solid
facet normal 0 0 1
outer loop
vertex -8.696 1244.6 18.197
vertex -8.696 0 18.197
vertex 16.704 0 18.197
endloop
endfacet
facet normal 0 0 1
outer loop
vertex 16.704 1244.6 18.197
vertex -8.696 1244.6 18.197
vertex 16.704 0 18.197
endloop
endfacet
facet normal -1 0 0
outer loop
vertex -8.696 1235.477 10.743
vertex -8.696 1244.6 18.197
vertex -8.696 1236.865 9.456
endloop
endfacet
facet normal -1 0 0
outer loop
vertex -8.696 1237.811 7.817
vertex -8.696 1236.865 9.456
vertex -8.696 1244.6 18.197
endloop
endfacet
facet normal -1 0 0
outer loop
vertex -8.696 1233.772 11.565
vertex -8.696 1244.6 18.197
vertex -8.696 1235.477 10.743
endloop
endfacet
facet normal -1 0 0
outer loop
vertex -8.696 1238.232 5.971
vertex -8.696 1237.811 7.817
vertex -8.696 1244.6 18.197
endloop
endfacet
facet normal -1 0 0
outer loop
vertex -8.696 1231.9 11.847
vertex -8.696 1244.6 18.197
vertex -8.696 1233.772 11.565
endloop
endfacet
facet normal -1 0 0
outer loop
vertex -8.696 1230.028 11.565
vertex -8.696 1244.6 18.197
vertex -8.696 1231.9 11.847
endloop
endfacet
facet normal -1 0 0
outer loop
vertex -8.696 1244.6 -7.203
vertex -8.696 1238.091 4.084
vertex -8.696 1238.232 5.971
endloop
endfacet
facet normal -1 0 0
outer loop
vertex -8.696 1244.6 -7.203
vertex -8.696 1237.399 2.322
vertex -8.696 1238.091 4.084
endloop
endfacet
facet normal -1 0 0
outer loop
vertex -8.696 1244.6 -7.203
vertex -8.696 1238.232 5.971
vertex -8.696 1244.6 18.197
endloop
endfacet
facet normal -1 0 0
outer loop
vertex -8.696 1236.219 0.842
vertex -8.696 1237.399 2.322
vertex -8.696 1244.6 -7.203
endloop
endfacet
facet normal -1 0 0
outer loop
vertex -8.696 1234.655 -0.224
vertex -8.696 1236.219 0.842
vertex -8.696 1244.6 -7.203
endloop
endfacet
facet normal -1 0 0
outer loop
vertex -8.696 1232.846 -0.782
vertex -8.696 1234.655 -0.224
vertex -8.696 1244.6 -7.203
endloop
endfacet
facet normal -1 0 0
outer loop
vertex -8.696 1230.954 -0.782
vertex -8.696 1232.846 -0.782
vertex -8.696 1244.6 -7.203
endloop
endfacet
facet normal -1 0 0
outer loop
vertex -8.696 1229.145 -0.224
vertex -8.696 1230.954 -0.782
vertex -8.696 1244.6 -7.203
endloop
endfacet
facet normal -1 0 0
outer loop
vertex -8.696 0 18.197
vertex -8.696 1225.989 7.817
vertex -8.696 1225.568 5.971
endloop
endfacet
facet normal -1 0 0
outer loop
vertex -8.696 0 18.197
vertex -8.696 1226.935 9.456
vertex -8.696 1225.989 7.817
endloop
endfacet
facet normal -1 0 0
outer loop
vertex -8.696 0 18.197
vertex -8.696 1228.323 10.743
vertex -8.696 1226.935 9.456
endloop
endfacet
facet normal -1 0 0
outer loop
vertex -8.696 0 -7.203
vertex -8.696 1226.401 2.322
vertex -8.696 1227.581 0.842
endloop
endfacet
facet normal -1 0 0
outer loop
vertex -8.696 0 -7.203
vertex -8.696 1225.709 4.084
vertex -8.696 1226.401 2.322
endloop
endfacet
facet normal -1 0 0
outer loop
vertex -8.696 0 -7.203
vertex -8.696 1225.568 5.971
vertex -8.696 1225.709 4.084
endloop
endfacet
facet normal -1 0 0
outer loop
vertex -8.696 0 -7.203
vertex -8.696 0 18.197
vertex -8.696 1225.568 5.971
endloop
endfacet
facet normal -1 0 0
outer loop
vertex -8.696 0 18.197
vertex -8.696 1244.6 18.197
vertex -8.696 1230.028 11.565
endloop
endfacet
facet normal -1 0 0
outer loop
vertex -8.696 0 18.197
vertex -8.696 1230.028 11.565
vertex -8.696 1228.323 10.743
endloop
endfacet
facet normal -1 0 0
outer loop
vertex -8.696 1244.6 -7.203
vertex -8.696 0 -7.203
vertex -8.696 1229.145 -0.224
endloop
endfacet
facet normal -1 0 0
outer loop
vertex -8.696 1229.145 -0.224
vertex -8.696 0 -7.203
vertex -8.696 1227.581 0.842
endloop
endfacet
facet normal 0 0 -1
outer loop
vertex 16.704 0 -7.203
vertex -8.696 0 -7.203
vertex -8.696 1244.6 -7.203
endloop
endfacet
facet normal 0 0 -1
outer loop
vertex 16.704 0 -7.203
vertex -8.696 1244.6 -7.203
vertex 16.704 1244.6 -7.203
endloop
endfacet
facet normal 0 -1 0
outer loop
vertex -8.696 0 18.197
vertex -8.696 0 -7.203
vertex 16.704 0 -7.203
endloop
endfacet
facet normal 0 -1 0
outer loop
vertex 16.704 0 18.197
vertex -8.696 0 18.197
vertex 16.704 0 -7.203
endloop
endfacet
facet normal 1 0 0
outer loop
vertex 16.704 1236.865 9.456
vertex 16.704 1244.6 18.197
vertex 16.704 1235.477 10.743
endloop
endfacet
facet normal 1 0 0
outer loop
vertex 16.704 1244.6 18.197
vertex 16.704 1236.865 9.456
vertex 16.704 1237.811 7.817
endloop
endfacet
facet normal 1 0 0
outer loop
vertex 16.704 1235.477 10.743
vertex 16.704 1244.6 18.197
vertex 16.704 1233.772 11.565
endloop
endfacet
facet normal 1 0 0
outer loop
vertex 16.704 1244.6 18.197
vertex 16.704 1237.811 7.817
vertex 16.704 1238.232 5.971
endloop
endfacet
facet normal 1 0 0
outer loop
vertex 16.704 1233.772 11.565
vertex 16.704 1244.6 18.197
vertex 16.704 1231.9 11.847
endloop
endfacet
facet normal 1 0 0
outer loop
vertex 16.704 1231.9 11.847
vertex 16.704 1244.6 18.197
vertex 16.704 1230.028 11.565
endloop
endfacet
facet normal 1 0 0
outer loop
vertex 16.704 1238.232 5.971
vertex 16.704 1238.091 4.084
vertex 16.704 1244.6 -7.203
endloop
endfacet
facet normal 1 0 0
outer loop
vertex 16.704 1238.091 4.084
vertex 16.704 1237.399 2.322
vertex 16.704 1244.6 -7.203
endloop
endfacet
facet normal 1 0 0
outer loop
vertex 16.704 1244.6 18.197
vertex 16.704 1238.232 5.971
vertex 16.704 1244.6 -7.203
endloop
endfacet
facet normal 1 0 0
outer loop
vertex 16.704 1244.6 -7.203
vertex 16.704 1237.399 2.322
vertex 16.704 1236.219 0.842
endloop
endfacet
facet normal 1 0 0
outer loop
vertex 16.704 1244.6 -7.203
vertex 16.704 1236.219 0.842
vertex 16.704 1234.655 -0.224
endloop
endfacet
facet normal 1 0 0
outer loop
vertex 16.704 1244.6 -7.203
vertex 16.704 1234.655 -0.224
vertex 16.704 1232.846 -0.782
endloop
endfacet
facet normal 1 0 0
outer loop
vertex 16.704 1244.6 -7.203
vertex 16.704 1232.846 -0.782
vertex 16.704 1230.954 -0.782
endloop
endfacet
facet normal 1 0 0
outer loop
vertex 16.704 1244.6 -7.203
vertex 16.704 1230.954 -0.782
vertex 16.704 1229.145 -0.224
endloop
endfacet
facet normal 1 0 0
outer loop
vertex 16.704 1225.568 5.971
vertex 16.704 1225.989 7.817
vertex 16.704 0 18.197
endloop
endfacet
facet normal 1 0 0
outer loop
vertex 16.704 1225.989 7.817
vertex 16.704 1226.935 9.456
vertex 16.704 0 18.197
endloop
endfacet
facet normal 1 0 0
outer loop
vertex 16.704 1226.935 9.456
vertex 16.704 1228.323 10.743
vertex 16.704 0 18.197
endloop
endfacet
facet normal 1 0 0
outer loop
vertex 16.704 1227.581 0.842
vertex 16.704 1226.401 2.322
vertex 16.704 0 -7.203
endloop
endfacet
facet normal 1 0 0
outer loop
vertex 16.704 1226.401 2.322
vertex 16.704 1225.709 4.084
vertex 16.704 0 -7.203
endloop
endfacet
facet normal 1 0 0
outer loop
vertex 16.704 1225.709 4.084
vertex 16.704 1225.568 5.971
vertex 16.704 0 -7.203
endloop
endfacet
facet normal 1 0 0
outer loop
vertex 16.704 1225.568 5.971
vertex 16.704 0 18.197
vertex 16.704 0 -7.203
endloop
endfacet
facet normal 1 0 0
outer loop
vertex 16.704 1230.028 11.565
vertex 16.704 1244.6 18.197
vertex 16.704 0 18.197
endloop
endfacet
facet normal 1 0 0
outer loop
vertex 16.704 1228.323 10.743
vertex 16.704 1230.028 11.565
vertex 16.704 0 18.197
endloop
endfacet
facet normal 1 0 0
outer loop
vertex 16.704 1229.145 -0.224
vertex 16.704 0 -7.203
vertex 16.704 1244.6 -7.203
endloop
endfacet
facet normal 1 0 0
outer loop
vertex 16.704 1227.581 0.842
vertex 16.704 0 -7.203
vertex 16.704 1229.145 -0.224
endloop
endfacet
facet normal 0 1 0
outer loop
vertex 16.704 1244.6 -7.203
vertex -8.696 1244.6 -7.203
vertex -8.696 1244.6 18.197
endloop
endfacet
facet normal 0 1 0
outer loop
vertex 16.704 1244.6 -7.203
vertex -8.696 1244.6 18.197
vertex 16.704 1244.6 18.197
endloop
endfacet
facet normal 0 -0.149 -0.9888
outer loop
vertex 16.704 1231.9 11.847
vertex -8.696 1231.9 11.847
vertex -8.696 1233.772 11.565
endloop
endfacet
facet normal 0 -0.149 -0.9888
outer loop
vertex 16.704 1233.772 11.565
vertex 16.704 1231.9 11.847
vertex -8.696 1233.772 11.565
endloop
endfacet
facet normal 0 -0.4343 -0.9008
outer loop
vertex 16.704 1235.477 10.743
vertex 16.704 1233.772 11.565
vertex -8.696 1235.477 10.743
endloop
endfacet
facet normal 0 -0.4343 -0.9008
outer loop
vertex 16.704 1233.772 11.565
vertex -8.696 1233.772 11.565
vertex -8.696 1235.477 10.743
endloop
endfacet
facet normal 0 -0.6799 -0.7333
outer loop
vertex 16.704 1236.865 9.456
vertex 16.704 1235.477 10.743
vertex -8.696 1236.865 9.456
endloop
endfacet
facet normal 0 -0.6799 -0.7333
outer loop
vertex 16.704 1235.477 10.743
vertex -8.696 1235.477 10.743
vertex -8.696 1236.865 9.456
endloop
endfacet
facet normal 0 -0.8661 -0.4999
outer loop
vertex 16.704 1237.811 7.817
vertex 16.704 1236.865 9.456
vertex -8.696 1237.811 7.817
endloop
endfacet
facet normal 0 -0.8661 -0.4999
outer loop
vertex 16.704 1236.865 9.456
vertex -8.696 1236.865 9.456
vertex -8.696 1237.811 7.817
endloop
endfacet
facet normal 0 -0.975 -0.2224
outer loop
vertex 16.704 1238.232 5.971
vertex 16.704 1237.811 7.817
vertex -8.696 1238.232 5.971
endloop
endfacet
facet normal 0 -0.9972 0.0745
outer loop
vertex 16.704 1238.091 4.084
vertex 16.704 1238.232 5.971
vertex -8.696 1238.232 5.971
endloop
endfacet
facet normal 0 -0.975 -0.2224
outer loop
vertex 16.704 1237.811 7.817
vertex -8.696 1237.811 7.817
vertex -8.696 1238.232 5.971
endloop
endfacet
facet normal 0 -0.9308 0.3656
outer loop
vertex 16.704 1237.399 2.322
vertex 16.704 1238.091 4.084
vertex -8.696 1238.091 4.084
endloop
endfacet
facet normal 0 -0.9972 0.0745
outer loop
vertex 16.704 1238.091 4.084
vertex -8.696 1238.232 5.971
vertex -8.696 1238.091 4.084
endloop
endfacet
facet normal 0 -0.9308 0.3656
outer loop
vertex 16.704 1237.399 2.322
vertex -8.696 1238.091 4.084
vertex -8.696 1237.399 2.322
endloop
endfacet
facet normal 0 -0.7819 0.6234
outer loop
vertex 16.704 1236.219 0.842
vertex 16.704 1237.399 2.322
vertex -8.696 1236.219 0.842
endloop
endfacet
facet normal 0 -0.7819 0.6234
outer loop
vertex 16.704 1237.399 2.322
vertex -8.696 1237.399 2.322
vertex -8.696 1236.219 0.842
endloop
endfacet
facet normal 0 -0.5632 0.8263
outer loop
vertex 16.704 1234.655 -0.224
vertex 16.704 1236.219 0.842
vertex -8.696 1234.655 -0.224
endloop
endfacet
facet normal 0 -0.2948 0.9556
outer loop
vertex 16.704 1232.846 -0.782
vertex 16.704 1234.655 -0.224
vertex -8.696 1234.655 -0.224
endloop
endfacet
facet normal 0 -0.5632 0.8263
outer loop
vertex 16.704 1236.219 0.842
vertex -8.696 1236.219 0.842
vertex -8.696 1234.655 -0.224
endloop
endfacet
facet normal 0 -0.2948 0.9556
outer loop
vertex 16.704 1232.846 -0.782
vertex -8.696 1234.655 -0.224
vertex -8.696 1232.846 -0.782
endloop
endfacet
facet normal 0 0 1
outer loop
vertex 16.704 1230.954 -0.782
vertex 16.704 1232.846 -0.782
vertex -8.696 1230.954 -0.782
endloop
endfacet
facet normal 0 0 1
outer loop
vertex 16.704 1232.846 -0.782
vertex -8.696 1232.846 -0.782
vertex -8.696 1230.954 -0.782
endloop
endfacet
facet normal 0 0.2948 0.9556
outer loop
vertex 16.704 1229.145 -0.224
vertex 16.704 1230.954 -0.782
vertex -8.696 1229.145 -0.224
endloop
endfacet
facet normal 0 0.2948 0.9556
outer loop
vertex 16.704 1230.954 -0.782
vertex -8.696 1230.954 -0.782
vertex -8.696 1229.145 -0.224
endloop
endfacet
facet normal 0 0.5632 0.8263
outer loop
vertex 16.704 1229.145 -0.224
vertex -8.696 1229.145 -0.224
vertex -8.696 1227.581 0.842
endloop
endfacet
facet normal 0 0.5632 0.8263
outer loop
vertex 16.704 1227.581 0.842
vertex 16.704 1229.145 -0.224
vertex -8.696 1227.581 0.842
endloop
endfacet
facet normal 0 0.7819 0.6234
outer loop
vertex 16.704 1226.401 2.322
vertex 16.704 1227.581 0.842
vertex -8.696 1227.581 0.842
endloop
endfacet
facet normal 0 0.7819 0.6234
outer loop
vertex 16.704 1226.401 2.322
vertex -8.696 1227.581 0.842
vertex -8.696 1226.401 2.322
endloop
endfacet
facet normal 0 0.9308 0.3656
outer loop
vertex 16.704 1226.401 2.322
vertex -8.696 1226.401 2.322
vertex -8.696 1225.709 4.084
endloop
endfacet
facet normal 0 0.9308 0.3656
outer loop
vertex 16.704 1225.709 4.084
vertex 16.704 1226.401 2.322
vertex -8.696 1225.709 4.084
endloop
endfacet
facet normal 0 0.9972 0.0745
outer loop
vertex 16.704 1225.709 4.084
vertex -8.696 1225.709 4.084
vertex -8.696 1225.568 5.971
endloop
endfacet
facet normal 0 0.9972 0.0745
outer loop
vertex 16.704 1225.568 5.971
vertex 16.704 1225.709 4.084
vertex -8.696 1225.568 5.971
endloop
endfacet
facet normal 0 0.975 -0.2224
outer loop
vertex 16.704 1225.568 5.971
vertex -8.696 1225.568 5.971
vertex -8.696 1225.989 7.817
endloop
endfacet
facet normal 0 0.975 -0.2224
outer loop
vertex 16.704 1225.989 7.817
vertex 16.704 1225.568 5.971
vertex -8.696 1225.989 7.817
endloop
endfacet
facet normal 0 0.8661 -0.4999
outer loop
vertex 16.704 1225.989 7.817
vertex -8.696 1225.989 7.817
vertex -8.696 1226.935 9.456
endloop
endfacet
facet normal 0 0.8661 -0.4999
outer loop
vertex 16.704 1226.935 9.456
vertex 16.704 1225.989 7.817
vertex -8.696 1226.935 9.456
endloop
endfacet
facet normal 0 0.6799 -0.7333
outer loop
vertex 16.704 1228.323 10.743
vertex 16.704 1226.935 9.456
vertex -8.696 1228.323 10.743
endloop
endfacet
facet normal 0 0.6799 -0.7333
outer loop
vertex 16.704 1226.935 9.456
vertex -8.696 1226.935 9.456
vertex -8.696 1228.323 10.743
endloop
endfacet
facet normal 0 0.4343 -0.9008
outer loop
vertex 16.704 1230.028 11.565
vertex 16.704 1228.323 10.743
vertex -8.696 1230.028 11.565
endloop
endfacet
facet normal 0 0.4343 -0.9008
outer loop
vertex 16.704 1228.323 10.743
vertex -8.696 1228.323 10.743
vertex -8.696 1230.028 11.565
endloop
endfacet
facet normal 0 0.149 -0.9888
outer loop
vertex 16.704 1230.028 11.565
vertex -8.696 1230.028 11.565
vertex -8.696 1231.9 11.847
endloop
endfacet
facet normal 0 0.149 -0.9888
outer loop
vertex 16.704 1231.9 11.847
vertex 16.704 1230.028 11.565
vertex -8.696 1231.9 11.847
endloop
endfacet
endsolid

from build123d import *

# Parameters (mm, degrees)
SKETCH1_W           = 25.4
SKETCH1_H           = 25.4
BOSS_EXTRUDE1_DEPTH = 1244.6
SKETCH2_R           = 6.35
CUT_EXTRUDE1_DEPTH  = 25.4


with BuildPart() as part:
    # Sketch1 → Boss-Extrude1 (new body)
    with BuildSketch(Plane(origin=(0, 0, 0), x_dir=(1, 0, 0), z_dir=(0, 1, 0))):
        with Locations((4.003864344, -5.496691195)):
            Rectangle(SKETCH1_W, SKETCH1_H)
    extrude(amount=BOSS_EXTRUDE1_DEPTH)

    # Sketch2 → Cut-Extrude1 (cut)
    with BuildSketch(Plane.ZY.offset(8.696135656)):
        with Locations((5.496691195, 1231.9)):
            Circle(SKETCH2_R)
    extrude(amount=-CUT_EXTRUDE1_DEPTH, mode=Mode.SUBTRACT)


solid = part.part
